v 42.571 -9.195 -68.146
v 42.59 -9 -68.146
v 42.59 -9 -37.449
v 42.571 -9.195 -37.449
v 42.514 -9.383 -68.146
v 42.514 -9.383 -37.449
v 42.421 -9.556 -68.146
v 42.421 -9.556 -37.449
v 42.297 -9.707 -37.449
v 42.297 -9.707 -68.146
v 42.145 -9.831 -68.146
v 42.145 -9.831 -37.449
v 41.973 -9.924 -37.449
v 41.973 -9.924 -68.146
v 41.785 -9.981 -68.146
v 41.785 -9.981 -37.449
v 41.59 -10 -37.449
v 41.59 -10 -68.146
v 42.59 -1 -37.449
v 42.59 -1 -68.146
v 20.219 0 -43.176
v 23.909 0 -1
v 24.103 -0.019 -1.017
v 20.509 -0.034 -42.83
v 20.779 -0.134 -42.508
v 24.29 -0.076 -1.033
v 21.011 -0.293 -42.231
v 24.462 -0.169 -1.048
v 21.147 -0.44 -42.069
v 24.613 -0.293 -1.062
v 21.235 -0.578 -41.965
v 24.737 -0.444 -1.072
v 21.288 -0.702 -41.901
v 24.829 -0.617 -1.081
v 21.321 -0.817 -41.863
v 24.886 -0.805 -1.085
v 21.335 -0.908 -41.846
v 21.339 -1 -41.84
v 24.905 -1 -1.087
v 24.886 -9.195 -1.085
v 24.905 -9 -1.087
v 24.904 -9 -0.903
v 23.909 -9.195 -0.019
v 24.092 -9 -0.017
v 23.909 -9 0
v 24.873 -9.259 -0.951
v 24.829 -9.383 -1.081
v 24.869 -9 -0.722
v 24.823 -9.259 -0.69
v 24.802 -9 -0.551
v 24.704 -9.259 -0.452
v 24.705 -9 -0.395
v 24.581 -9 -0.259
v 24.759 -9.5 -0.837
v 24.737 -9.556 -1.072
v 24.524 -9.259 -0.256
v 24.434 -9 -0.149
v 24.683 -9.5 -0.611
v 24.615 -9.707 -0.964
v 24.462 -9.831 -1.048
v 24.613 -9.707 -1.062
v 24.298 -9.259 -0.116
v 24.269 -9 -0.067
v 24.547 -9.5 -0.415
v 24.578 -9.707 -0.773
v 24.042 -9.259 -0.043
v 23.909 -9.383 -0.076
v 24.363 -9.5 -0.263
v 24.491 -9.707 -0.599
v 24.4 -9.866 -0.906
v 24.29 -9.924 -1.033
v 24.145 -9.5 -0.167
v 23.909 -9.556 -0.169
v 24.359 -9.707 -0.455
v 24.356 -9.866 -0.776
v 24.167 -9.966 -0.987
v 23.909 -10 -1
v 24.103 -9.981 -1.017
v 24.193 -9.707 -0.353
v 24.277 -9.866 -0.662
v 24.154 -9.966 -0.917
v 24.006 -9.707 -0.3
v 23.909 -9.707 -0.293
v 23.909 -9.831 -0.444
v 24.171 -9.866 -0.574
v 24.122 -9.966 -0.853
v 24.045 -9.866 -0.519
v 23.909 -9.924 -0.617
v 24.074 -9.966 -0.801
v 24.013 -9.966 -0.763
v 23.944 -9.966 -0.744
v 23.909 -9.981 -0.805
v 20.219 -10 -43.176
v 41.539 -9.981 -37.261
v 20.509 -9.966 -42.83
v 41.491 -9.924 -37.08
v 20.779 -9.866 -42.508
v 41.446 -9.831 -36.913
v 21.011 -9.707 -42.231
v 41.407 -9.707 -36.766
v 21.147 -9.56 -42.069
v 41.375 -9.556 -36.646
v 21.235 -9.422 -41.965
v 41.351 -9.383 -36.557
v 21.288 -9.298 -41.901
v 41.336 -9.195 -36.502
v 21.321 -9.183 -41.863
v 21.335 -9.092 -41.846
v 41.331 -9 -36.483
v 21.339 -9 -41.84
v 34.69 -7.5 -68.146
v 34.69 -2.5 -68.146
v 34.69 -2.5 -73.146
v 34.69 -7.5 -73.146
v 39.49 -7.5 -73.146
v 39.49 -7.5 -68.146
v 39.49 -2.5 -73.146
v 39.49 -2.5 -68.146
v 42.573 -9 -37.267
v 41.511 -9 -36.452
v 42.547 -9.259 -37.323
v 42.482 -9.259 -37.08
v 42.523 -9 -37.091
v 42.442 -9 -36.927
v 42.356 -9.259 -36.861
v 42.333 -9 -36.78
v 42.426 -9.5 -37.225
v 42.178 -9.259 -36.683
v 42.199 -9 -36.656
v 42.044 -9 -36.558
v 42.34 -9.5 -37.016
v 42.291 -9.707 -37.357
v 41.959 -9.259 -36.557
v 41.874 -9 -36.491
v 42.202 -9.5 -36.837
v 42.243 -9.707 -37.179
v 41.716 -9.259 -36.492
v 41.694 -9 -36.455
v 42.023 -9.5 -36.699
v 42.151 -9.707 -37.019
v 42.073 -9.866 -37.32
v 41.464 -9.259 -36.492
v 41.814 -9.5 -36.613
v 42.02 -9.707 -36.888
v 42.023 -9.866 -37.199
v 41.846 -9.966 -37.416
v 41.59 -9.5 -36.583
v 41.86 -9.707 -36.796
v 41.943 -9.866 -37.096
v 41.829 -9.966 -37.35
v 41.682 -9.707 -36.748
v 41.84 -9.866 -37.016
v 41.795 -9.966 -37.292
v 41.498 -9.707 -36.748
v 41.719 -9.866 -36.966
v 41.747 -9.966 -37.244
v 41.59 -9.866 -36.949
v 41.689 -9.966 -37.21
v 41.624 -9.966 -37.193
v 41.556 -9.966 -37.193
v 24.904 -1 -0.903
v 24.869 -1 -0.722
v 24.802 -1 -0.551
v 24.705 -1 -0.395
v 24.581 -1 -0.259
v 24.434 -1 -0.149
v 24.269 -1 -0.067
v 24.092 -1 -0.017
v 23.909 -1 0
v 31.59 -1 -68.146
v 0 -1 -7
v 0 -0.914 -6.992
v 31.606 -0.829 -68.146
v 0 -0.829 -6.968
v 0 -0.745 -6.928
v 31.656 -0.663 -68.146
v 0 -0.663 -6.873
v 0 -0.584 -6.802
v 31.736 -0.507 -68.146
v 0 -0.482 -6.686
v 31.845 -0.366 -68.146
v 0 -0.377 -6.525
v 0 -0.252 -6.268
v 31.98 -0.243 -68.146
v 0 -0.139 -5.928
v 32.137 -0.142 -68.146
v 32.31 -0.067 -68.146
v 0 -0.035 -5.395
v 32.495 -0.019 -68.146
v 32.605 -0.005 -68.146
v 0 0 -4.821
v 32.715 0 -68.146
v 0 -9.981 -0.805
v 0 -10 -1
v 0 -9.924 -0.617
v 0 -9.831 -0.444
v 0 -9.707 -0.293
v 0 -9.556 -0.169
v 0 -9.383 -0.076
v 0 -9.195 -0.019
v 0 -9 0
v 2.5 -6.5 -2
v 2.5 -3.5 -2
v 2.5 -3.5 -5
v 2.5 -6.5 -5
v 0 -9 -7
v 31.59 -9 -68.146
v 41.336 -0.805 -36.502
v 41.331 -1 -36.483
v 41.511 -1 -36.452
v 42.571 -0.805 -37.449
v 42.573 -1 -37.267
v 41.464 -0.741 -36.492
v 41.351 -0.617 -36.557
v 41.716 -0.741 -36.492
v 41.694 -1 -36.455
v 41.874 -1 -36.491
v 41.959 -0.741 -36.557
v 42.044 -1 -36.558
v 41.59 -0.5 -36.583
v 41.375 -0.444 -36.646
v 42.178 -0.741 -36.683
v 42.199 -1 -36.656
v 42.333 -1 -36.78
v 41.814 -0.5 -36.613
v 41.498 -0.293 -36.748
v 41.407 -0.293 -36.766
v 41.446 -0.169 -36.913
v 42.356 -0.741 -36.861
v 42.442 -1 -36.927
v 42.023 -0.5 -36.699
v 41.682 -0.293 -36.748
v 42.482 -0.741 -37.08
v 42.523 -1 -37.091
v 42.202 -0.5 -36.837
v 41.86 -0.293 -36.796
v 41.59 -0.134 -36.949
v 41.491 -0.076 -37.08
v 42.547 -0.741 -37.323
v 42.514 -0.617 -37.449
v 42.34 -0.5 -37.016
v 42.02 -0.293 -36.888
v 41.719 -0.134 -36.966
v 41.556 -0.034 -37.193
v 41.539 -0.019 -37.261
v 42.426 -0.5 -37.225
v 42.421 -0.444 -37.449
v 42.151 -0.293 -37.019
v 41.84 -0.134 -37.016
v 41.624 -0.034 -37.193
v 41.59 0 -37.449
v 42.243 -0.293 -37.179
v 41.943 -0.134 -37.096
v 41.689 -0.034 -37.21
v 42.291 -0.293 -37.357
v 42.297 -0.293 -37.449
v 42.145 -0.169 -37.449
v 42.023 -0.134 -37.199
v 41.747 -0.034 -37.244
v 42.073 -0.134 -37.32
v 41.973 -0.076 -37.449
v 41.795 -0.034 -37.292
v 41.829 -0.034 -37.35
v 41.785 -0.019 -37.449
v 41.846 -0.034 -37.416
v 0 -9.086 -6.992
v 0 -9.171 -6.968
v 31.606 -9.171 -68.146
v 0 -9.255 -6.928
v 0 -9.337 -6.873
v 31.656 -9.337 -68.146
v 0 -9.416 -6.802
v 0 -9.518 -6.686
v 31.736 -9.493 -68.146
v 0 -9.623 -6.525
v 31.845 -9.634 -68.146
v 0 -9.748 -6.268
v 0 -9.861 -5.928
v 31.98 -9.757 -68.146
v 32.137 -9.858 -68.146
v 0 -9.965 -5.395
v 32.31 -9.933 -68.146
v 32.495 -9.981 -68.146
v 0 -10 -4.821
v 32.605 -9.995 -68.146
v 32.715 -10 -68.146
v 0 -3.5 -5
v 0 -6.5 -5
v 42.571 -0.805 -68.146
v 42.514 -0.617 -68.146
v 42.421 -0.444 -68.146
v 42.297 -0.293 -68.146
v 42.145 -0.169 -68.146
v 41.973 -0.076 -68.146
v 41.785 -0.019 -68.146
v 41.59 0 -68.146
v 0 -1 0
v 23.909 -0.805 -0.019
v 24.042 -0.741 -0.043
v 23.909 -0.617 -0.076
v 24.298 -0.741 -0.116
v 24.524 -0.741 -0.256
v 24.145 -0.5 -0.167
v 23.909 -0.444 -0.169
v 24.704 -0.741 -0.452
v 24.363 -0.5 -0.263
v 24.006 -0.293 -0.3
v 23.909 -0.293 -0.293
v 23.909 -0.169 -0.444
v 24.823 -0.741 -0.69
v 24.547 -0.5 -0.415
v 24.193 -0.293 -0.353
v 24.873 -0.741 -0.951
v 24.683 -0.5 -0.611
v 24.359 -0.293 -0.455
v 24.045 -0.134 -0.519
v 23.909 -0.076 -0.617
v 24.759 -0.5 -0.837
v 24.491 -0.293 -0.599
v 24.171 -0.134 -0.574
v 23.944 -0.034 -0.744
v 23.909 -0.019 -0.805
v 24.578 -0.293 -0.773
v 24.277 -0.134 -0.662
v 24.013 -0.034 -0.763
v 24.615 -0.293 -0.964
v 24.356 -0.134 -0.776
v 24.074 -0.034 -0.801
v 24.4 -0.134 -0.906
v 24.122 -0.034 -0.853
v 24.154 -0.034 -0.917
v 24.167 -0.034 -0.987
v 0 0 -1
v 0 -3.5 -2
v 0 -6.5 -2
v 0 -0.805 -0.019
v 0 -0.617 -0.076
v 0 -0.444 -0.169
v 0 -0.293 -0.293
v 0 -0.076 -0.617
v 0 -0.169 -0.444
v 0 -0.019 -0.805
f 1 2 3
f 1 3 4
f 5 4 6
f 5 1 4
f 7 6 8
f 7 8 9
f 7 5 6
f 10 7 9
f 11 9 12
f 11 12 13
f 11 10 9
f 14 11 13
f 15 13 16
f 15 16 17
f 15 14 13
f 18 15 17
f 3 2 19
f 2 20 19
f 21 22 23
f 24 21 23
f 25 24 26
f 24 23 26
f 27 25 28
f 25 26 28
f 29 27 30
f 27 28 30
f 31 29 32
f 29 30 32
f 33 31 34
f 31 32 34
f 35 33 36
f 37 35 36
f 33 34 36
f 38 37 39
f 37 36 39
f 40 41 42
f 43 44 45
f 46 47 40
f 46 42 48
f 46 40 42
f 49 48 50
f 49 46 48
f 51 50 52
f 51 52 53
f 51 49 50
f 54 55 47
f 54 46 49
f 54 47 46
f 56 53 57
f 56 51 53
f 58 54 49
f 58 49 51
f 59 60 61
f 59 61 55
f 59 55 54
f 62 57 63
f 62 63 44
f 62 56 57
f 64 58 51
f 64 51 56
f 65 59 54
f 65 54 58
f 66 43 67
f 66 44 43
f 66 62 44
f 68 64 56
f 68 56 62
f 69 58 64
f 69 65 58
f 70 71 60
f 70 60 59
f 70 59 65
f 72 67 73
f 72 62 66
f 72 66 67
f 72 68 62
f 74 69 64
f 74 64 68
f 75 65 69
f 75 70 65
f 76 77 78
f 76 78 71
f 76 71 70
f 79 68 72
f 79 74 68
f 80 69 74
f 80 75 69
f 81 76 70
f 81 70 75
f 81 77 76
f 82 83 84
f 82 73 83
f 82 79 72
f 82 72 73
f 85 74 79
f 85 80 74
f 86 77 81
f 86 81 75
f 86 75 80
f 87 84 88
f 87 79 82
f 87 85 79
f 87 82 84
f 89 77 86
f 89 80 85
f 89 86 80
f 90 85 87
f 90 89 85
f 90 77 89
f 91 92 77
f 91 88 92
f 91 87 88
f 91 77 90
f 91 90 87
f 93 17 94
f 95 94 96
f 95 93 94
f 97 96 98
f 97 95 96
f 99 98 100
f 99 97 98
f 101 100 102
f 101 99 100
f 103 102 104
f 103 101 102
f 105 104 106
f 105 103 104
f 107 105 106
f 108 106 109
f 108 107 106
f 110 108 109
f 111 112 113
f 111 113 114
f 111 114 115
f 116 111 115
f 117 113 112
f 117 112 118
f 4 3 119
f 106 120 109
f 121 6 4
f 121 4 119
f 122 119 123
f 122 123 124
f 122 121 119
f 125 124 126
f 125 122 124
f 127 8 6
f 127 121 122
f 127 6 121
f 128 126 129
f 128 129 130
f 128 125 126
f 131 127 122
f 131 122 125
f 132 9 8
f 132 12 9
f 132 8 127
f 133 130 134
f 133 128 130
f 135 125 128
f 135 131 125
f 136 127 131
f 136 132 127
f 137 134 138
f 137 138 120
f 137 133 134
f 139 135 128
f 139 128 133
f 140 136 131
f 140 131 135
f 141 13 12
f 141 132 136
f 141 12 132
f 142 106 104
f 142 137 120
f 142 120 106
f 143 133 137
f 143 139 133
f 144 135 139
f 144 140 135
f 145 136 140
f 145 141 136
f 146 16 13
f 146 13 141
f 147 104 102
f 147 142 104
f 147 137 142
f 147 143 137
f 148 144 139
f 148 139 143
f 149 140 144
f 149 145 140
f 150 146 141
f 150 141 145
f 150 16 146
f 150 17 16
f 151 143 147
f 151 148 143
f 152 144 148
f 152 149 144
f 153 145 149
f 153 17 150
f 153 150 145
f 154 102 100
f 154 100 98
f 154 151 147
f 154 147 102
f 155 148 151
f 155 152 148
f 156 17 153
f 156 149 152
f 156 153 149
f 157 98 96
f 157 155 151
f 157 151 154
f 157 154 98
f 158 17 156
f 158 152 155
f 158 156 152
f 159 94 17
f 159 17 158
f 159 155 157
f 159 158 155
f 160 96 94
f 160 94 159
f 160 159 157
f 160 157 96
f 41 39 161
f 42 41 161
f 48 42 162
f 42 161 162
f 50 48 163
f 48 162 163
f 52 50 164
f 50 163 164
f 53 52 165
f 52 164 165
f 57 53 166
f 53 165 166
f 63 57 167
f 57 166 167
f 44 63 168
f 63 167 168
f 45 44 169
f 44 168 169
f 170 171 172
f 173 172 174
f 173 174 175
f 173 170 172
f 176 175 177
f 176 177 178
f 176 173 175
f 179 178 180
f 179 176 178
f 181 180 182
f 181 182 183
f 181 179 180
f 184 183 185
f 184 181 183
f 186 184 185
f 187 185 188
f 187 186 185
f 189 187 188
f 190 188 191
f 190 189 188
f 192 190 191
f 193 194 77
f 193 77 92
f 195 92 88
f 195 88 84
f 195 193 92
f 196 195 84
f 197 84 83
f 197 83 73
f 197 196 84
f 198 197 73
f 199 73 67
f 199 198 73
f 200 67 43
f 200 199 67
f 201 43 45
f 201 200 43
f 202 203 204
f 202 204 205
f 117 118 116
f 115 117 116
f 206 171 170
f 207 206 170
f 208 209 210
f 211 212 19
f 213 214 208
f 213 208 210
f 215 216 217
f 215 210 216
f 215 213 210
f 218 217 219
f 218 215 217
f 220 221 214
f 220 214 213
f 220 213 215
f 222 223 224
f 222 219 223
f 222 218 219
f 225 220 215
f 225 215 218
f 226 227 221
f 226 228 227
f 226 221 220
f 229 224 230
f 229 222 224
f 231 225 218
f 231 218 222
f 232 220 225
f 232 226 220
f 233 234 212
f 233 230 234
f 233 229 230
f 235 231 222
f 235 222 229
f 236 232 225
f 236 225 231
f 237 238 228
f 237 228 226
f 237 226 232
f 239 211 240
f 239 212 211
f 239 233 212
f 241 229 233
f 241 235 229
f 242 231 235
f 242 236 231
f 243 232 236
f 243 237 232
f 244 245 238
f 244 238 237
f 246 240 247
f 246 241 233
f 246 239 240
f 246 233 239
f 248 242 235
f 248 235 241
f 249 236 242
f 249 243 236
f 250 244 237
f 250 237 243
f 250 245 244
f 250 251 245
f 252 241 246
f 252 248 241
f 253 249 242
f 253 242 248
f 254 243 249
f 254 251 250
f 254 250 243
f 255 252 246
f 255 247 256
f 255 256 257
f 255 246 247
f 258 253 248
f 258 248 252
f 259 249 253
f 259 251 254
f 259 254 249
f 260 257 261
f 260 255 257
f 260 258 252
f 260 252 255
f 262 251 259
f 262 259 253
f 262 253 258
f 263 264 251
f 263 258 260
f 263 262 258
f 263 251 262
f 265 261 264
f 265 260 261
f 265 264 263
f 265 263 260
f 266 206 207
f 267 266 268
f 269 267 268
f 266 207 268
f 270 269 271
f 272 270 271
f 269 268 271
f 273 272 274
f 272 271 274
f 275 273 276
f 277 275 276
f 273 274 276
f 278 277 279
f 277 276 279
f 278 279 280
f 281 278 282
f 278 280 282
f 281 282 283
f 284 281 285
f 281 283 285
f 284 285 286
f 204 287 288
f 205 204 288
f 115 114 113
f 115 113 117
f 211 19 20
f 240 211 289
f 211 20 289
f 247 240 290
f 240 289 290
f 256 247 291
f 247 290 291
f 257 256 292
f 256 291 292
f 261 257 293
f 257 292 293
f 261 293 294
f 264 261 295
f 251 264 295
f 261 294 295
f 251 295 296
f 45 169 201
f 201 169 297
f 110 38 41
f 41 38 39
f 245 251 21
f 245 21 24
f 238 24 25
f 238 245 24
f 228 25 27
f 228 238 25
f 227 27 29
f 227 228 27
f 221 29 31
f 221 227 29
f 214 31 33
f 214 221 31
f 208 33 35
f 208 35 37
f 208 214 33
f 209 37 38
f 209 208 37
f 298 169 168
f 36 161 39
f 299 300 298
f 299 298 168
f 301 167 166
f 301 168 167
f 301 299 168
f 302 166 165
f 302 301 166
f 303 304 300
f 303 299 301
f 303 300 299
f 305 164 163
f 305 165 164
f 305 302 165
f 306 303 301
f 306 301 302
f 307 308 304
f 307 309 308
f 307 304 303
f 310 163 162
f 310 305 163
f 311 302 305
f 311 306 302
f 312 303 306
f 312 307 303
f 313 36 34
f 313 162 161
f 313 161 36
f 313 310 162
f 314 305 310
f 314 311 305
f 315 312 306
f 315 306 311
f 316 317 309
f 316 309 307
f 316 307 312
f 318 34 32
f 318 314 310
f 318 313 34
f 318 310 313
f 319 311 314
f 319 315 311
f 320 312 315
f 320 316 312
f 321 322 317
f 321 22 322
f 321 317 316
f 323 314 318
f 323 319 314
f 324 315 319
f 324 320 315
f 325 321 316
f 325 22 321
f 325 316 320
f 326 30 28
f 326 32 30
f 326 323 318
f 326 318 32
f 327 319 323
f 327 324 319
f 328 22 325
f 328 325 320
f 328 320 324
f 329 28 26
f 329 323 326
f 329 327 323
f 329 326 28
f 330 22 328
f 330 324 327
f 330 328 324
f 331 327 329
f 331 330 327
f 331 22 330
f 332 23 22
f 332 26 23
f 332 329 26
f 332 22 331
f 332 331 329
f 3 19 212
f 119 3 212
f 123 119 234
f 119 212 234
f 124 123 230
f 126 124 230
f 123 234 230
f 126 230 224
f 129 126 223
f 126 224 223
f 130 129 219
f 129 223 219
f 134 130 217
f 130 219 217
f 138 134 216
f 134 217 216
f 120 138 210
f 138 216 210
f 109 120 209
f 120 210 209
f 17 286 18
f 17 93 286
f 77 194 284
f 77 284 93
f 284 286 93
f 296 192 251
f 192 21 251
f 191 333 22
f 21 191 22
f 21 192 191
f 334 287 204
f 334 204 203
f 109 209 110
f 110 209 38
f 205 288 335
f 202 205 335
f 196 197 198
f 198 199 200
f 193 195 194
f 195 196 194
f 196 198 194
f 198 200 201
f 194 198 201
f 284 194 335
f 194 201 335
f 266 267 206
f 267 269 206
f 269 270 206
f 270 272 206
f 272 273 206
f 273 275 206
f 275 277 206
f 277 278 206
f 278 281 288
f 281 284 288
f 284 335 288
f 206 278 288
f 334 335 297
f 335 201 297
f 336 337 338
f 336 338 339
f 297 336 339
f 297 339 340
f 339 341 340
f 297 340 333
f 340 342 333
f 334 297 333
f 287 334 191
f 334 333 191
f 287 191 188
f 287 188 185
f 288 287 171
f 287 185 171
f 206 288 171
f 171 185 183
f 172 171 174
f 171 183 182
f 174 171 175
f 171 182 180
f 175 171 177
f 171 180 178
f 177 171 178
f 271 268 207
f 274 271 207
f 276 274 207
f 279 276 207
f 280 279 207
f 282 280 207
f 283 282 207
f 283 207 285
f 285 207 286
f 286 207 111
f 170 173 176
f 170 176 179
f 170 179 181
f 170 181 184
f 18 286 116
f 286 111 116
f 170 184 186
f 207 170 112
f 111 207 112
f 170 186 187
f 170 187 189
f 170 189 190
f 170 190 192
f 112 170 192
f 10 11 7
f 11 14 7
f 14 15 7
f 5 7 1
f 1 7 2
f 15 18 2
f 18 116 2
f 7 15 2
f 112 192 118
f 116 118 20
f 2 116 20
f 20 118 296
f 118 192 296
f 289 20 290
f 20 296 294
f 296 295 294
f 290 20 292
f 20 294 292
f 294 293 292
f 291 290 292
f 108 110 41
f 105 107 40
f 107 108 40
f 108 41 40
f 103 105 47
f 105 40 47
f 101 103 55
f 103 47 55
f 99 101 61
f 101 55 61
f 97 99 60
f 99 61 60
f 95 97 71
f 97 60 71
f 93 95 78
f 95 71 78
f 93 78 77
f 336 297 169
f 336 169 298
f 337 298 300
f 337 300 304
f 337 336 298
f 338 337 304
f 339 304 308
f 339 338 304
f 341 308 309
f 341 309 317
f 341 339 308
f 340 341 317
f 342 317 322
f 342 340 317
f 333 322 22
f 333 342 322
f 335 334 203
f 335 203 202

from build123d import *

# Parameters (mm, degrees)
F1_DEPTH      = 10
F3_W          = 4.8
F3_H          = 5
F4_DEPTH      = 5
F5_W          = 3
F5_H          = 3
F6_DEPTH      = 2.5
F7_R          = 1
F8_R          = 1
F9_R          = 1
F10_R         = 1
F11_R         = 1
F12_T1_DEPTH  = 33.1967746272
F12_T3_DEPTH  = 8
F12_T8_DEPTH  = 1
F12_T14_DEPTH = 1
F13_T1_DEPTH  = 26.4086914989
F13_T3_DEPTH  = 8
F13_T8_DEPTH  = 1
F13_T14_DEPTH = 1


# Not quite as in the source:
# - a fillet or chamfer that OpenCascade refuses, or shapes differently, is made with other operations: its cross-section is extruded or revolved along the edge and cut away or added


with BuildPart() as f1:
    # F0 (on Front) → F1 (new body)
    with BuildSketch(Plane.XZ):
        Polygon((25, 0), (0, 0), (0, -7), (31.589826983, -68.1461583276), (42.589826983, -68.1461583276), (42.589826983, -36.1461583276), (21.3394588046, -41.8401773199), align=None)
    extrude(amount=F1_DEPTH)

    # F3 (on face) → F4 (join)
    with BuildSketch(Plane(origin=(0, 0, -68.1461583276), x_dir=(1, 0, 0), z_dir=(0, 0, -1))):
        with Locations((37.089826983, 5)):
            Rectangle(F3_W, F3_H)
    extrude(amount=F4_DEPTH)

    # F5 (on face) → F6 (cut)
    with BuildSketch(Plane(origin=(0, 0, 0), x_dir=(0, -1, 0), z_dir=(-1, 0, 0))):
        with Locations((5, -3.5)):
            Rectangle(F5_W, F5_H)
    extrude(amount=-F6_DEPTH, mode=Mode.SUBTRACT)

    # F7
    f7_edges = [f1.edges().sort_by_distance(p)[0] for p in [
        (23.169729, -10, -20.920089),
    ]]
    fillet(f7_edges, radius=F7_R)

    # F8
    f8_edges = [f1.edges().sort_by_distance(p)[0] for p in [
        (23.169729, 0, -20.920089),
    ]]
    fillet(f8_edges, radius=F8_R)

    # F9
    f9_edges = [f1.edges().sort_by_distance(p)[0] for p in [
        (15.794913, 0, -37.573079),
        (15.794913, -10, -37.573079),
    ]]
    fillet(f9_edges, radius=F9_R)

    # F10
    f10_edges = [f1.edges().sort_by_distance(p)[0] for p in [
        (31.964643, 0, -38.993168),
    ]]
    fillet(f10_edges, radius=F10_R)

    # F11
    f11_edges = [f1.edges().sort_by_distance(p)[0] for p in [
        (31.964643, -10, -38.993168),
    ]]
    fillet(f11_edges, radius=F11_R)

    # F12: fillet of radius 1 on 1 edges, made by hand

    # F12_s2 → F12_t1 (cut)
    with BuildSketch(Plane.XY.offset(-70.6461583276)):
        with BuildLine():
            ThreePointArc((42.589826983, -1), (42.2969337641, -0.2928932188), (41.589826983, 0))
            Line((41.589826983, 0), (42.589826983, 0))
            Line((42.589826983, 0), (42.589826983, -1))
        make_face()
        with BuildLine():
            ThreePointArc((42.589826983, -9), (42.2969337641, -9.7071067812), (41.589826983, -10))
            Line((41.589826983, -10), (42.589826983, -10))
            Line((42.589826983, -10), (42.589826983, -9))
        make_face()
    extrude(amount=F12_T1_DEPTH, mode=Mode.SUBTRACT)

    # F12_s4 → F12_t3 (cut)
    with BuildSketch(Plane.XZ.offset(1)):
        with BuildLine():
            ThreePointArc((42.589826983, -37.4493837004), (42.198588412, -36.6560303601), (41.3310079379, -36.4834578742))
            Line((41.3310079379, -36.4834578742), (42.589826983, -36.1461583276))
            Line((42.589826983, -36.1461583276), (42.589826983, -37.4493837004))
        make_face()
    extrude(amount=F12_T3_DEPTH, mode=Mode.SUBTRACT)


with BuildPart() as f12_tool6:
    # F12_s7 → F12_t8 (new body)
    with BuildSketch(Plane.XZ.offset(1)):
        Polygon((41.589826983, -37.4493837004), (42.589826983, -37.4493837004), (42.589826983, -36.1461583276), (41.3310079379, -36.4834578742), align=None)
    extrude(amount=-F12_T8_DEPTH)

    # F12_s9 → F12_t10 (revolve, cut)
    with BuildSketch(Plane(origin=(41.589826983, -1, -37.4493837004), x_dir=(-0.608761429, 0, -0.7933533403), z_dir=(0.7933533403, 0, -0.608761429))):
        with BuildLine():
            ThreePointArc((0, -1), (1, 0), (0, 1))
            Line((0, 1), (0, -1))
        make_face()
    revolve(axis=Axis((41.589826983, -1, -37.4493837004), (0, 1, 0)), mode=Mode.SUBTRACT)


with BuildPart() as f1_1:
    add(f1.part)

    # F12_t5: cut F12_tool6
    add(f12_tool6.part, mode=Mode.SUBTRACT)


with BuildPart() as f12_tool12:
    # F12_s13 → F12_t14 (new body)
    with BuildSketch(Plane.XZ.offset(9)):
        Polygon((41.589826983, -37.4493837004), (42.589826983, -37.4493837004), (42.589826983, -36.1461583276), (41.3310079379, -36.4834578742), align=None)
    extrude(amount=F12_T14_DEPTH)

    # F12_s15 → F12_t16 (revolve, cut)
    with BuildSketch(Plane(origin=(41.589826983, -9, -37.4493837004), x_dir=(-0.608761429, 0, -0.7933533403), z_dir=(-0.7933533403, 0, 0.608761429))):
        with BuildLine():
            ThreePointArc((0, -1), (1, 0), (0, 1))
            Line((0, 1), (0, -1))
        make_face()
    revolve(axis=Axis((41.589826983, -9, -37.4493837004), (0, -1, 0)), mode=Mode.SUBTRACT)


with BuildPart() as f1_2:
    add(f1_1.part)

    # F12_t11: cut F12_tool12
    add(f12_tool12.part, mode=Mode.SUBTRACT)

    # F13: fillet of radius 1 on 3 edges, made by hand

    # F13_s2 → F13_t1 (cut)
    with BuildSketch(Plane.YZ.offset(-2.5)):
        with BuildLine():
            ThreePointArc((-10, -1), (-9.7071067812, -0.2928932188), (-9, 0))
            Line((-9, 0), (-10, 0))
            Line((-10, 0), (-10, -1))
        make_face()
        with BuildLine():
            ThreePointArc((-1, 0), (-0.2928932188, -0.2928932188), (0, -1))
            Line((0, -1), (0, 0))
            Line((0, 0), (-1, 0))
        make_face()
    extrude(amount=F13_T1_DEPTH, mode=Mode.SUBTRACT)

    # F13_s4 → F13_t3 (cut)
    with BuildSketch(Plane.XZ.offset(1)):
        with BuildLine():
            ThreePointArc((24.904886197, -1.0871557427), (24.6459688357, -0.3244097924), (23.9086914989, 0))
            Line((23.9086914989, 0), (25, 0))
            Line((25, 0), (24.904886197, -1.0871557427))
        make_face()
    extrude(amount=F13_T3_DEPTH, mode=Mode.SUBTRACT)


with BuildPart() as f13_tool6:
    # F13_s7 → F13_t8 (new body)
    with BuildSketch(Plane.XZ.offset(1)):
        Polygon((23.9086914989, -1), (24.904886197, -1.0871557427), (25, 0), (23.9086914989, 0), align=None)
    extrude(amount=-F13_T8_DEPTH)

    # F13_s9 → F13_t10 (revolve, cut)
    with BuildSketch(Plane(origin=(23.9086914989, -1, -1), x_dir=(-0.7372773368, 0, -0.6755902076), z_dir=(0.6755902076, 0, -0.7372773368))):
        with BuildLine():
            ThreePointArc((0, -1), (1, 0), (0, 1))
            Line((0, 1), (0, -1))
        make_face()
    revolve(axis=Axis((23.9086914989, -1, -1), (0, 1, 0)), mode=Mode.SUBTRACT)


with BuildPart() as f1_3:
    add(f1_2.part)

    # F13_t5: cut F13_tool6
    add(f13_tool6.part, mode=Mode.SUBTRACT)


with BuildPart() as f13_tool12:
    # F13_s13 → F13_t14 (new body)
    with BuildSketch(Plane.XZ.offset(9)):
        Polygon((23.9086914989, -1), (24.904886197, -1.0871557427), (25, 0), (23.9086914989, 0), align=None)
    extrude(amount=F13_T14_DEPTH)

    # F13_s15 → F13_t16 (revolve, cut)
    with BuildSketch(Plane(origin=(23.9086914989, -9, -1), x_dir=(-0.7372773368, 0, -0.6755902076), z_dir=(-0.6755902076, 0, 0.7372773368))):
        with BuildLine():
            ThreePointArc((0, -1), (1, 0), (0, 1))
            Line((0, 1), (0, -1))
        make_face()
    revolve(axis=Axis((23.9086914989, -9, -1), (0, -1, 0)), mode=Mode.SUBTRACT)


with BuildPart() as f1_4:
    add(f1_3.part)

    # F13_t11: cut F13_tool12
    add(f13_tool12.part, mode=Mode.SUBTRACT)


solid = f1_4.part
